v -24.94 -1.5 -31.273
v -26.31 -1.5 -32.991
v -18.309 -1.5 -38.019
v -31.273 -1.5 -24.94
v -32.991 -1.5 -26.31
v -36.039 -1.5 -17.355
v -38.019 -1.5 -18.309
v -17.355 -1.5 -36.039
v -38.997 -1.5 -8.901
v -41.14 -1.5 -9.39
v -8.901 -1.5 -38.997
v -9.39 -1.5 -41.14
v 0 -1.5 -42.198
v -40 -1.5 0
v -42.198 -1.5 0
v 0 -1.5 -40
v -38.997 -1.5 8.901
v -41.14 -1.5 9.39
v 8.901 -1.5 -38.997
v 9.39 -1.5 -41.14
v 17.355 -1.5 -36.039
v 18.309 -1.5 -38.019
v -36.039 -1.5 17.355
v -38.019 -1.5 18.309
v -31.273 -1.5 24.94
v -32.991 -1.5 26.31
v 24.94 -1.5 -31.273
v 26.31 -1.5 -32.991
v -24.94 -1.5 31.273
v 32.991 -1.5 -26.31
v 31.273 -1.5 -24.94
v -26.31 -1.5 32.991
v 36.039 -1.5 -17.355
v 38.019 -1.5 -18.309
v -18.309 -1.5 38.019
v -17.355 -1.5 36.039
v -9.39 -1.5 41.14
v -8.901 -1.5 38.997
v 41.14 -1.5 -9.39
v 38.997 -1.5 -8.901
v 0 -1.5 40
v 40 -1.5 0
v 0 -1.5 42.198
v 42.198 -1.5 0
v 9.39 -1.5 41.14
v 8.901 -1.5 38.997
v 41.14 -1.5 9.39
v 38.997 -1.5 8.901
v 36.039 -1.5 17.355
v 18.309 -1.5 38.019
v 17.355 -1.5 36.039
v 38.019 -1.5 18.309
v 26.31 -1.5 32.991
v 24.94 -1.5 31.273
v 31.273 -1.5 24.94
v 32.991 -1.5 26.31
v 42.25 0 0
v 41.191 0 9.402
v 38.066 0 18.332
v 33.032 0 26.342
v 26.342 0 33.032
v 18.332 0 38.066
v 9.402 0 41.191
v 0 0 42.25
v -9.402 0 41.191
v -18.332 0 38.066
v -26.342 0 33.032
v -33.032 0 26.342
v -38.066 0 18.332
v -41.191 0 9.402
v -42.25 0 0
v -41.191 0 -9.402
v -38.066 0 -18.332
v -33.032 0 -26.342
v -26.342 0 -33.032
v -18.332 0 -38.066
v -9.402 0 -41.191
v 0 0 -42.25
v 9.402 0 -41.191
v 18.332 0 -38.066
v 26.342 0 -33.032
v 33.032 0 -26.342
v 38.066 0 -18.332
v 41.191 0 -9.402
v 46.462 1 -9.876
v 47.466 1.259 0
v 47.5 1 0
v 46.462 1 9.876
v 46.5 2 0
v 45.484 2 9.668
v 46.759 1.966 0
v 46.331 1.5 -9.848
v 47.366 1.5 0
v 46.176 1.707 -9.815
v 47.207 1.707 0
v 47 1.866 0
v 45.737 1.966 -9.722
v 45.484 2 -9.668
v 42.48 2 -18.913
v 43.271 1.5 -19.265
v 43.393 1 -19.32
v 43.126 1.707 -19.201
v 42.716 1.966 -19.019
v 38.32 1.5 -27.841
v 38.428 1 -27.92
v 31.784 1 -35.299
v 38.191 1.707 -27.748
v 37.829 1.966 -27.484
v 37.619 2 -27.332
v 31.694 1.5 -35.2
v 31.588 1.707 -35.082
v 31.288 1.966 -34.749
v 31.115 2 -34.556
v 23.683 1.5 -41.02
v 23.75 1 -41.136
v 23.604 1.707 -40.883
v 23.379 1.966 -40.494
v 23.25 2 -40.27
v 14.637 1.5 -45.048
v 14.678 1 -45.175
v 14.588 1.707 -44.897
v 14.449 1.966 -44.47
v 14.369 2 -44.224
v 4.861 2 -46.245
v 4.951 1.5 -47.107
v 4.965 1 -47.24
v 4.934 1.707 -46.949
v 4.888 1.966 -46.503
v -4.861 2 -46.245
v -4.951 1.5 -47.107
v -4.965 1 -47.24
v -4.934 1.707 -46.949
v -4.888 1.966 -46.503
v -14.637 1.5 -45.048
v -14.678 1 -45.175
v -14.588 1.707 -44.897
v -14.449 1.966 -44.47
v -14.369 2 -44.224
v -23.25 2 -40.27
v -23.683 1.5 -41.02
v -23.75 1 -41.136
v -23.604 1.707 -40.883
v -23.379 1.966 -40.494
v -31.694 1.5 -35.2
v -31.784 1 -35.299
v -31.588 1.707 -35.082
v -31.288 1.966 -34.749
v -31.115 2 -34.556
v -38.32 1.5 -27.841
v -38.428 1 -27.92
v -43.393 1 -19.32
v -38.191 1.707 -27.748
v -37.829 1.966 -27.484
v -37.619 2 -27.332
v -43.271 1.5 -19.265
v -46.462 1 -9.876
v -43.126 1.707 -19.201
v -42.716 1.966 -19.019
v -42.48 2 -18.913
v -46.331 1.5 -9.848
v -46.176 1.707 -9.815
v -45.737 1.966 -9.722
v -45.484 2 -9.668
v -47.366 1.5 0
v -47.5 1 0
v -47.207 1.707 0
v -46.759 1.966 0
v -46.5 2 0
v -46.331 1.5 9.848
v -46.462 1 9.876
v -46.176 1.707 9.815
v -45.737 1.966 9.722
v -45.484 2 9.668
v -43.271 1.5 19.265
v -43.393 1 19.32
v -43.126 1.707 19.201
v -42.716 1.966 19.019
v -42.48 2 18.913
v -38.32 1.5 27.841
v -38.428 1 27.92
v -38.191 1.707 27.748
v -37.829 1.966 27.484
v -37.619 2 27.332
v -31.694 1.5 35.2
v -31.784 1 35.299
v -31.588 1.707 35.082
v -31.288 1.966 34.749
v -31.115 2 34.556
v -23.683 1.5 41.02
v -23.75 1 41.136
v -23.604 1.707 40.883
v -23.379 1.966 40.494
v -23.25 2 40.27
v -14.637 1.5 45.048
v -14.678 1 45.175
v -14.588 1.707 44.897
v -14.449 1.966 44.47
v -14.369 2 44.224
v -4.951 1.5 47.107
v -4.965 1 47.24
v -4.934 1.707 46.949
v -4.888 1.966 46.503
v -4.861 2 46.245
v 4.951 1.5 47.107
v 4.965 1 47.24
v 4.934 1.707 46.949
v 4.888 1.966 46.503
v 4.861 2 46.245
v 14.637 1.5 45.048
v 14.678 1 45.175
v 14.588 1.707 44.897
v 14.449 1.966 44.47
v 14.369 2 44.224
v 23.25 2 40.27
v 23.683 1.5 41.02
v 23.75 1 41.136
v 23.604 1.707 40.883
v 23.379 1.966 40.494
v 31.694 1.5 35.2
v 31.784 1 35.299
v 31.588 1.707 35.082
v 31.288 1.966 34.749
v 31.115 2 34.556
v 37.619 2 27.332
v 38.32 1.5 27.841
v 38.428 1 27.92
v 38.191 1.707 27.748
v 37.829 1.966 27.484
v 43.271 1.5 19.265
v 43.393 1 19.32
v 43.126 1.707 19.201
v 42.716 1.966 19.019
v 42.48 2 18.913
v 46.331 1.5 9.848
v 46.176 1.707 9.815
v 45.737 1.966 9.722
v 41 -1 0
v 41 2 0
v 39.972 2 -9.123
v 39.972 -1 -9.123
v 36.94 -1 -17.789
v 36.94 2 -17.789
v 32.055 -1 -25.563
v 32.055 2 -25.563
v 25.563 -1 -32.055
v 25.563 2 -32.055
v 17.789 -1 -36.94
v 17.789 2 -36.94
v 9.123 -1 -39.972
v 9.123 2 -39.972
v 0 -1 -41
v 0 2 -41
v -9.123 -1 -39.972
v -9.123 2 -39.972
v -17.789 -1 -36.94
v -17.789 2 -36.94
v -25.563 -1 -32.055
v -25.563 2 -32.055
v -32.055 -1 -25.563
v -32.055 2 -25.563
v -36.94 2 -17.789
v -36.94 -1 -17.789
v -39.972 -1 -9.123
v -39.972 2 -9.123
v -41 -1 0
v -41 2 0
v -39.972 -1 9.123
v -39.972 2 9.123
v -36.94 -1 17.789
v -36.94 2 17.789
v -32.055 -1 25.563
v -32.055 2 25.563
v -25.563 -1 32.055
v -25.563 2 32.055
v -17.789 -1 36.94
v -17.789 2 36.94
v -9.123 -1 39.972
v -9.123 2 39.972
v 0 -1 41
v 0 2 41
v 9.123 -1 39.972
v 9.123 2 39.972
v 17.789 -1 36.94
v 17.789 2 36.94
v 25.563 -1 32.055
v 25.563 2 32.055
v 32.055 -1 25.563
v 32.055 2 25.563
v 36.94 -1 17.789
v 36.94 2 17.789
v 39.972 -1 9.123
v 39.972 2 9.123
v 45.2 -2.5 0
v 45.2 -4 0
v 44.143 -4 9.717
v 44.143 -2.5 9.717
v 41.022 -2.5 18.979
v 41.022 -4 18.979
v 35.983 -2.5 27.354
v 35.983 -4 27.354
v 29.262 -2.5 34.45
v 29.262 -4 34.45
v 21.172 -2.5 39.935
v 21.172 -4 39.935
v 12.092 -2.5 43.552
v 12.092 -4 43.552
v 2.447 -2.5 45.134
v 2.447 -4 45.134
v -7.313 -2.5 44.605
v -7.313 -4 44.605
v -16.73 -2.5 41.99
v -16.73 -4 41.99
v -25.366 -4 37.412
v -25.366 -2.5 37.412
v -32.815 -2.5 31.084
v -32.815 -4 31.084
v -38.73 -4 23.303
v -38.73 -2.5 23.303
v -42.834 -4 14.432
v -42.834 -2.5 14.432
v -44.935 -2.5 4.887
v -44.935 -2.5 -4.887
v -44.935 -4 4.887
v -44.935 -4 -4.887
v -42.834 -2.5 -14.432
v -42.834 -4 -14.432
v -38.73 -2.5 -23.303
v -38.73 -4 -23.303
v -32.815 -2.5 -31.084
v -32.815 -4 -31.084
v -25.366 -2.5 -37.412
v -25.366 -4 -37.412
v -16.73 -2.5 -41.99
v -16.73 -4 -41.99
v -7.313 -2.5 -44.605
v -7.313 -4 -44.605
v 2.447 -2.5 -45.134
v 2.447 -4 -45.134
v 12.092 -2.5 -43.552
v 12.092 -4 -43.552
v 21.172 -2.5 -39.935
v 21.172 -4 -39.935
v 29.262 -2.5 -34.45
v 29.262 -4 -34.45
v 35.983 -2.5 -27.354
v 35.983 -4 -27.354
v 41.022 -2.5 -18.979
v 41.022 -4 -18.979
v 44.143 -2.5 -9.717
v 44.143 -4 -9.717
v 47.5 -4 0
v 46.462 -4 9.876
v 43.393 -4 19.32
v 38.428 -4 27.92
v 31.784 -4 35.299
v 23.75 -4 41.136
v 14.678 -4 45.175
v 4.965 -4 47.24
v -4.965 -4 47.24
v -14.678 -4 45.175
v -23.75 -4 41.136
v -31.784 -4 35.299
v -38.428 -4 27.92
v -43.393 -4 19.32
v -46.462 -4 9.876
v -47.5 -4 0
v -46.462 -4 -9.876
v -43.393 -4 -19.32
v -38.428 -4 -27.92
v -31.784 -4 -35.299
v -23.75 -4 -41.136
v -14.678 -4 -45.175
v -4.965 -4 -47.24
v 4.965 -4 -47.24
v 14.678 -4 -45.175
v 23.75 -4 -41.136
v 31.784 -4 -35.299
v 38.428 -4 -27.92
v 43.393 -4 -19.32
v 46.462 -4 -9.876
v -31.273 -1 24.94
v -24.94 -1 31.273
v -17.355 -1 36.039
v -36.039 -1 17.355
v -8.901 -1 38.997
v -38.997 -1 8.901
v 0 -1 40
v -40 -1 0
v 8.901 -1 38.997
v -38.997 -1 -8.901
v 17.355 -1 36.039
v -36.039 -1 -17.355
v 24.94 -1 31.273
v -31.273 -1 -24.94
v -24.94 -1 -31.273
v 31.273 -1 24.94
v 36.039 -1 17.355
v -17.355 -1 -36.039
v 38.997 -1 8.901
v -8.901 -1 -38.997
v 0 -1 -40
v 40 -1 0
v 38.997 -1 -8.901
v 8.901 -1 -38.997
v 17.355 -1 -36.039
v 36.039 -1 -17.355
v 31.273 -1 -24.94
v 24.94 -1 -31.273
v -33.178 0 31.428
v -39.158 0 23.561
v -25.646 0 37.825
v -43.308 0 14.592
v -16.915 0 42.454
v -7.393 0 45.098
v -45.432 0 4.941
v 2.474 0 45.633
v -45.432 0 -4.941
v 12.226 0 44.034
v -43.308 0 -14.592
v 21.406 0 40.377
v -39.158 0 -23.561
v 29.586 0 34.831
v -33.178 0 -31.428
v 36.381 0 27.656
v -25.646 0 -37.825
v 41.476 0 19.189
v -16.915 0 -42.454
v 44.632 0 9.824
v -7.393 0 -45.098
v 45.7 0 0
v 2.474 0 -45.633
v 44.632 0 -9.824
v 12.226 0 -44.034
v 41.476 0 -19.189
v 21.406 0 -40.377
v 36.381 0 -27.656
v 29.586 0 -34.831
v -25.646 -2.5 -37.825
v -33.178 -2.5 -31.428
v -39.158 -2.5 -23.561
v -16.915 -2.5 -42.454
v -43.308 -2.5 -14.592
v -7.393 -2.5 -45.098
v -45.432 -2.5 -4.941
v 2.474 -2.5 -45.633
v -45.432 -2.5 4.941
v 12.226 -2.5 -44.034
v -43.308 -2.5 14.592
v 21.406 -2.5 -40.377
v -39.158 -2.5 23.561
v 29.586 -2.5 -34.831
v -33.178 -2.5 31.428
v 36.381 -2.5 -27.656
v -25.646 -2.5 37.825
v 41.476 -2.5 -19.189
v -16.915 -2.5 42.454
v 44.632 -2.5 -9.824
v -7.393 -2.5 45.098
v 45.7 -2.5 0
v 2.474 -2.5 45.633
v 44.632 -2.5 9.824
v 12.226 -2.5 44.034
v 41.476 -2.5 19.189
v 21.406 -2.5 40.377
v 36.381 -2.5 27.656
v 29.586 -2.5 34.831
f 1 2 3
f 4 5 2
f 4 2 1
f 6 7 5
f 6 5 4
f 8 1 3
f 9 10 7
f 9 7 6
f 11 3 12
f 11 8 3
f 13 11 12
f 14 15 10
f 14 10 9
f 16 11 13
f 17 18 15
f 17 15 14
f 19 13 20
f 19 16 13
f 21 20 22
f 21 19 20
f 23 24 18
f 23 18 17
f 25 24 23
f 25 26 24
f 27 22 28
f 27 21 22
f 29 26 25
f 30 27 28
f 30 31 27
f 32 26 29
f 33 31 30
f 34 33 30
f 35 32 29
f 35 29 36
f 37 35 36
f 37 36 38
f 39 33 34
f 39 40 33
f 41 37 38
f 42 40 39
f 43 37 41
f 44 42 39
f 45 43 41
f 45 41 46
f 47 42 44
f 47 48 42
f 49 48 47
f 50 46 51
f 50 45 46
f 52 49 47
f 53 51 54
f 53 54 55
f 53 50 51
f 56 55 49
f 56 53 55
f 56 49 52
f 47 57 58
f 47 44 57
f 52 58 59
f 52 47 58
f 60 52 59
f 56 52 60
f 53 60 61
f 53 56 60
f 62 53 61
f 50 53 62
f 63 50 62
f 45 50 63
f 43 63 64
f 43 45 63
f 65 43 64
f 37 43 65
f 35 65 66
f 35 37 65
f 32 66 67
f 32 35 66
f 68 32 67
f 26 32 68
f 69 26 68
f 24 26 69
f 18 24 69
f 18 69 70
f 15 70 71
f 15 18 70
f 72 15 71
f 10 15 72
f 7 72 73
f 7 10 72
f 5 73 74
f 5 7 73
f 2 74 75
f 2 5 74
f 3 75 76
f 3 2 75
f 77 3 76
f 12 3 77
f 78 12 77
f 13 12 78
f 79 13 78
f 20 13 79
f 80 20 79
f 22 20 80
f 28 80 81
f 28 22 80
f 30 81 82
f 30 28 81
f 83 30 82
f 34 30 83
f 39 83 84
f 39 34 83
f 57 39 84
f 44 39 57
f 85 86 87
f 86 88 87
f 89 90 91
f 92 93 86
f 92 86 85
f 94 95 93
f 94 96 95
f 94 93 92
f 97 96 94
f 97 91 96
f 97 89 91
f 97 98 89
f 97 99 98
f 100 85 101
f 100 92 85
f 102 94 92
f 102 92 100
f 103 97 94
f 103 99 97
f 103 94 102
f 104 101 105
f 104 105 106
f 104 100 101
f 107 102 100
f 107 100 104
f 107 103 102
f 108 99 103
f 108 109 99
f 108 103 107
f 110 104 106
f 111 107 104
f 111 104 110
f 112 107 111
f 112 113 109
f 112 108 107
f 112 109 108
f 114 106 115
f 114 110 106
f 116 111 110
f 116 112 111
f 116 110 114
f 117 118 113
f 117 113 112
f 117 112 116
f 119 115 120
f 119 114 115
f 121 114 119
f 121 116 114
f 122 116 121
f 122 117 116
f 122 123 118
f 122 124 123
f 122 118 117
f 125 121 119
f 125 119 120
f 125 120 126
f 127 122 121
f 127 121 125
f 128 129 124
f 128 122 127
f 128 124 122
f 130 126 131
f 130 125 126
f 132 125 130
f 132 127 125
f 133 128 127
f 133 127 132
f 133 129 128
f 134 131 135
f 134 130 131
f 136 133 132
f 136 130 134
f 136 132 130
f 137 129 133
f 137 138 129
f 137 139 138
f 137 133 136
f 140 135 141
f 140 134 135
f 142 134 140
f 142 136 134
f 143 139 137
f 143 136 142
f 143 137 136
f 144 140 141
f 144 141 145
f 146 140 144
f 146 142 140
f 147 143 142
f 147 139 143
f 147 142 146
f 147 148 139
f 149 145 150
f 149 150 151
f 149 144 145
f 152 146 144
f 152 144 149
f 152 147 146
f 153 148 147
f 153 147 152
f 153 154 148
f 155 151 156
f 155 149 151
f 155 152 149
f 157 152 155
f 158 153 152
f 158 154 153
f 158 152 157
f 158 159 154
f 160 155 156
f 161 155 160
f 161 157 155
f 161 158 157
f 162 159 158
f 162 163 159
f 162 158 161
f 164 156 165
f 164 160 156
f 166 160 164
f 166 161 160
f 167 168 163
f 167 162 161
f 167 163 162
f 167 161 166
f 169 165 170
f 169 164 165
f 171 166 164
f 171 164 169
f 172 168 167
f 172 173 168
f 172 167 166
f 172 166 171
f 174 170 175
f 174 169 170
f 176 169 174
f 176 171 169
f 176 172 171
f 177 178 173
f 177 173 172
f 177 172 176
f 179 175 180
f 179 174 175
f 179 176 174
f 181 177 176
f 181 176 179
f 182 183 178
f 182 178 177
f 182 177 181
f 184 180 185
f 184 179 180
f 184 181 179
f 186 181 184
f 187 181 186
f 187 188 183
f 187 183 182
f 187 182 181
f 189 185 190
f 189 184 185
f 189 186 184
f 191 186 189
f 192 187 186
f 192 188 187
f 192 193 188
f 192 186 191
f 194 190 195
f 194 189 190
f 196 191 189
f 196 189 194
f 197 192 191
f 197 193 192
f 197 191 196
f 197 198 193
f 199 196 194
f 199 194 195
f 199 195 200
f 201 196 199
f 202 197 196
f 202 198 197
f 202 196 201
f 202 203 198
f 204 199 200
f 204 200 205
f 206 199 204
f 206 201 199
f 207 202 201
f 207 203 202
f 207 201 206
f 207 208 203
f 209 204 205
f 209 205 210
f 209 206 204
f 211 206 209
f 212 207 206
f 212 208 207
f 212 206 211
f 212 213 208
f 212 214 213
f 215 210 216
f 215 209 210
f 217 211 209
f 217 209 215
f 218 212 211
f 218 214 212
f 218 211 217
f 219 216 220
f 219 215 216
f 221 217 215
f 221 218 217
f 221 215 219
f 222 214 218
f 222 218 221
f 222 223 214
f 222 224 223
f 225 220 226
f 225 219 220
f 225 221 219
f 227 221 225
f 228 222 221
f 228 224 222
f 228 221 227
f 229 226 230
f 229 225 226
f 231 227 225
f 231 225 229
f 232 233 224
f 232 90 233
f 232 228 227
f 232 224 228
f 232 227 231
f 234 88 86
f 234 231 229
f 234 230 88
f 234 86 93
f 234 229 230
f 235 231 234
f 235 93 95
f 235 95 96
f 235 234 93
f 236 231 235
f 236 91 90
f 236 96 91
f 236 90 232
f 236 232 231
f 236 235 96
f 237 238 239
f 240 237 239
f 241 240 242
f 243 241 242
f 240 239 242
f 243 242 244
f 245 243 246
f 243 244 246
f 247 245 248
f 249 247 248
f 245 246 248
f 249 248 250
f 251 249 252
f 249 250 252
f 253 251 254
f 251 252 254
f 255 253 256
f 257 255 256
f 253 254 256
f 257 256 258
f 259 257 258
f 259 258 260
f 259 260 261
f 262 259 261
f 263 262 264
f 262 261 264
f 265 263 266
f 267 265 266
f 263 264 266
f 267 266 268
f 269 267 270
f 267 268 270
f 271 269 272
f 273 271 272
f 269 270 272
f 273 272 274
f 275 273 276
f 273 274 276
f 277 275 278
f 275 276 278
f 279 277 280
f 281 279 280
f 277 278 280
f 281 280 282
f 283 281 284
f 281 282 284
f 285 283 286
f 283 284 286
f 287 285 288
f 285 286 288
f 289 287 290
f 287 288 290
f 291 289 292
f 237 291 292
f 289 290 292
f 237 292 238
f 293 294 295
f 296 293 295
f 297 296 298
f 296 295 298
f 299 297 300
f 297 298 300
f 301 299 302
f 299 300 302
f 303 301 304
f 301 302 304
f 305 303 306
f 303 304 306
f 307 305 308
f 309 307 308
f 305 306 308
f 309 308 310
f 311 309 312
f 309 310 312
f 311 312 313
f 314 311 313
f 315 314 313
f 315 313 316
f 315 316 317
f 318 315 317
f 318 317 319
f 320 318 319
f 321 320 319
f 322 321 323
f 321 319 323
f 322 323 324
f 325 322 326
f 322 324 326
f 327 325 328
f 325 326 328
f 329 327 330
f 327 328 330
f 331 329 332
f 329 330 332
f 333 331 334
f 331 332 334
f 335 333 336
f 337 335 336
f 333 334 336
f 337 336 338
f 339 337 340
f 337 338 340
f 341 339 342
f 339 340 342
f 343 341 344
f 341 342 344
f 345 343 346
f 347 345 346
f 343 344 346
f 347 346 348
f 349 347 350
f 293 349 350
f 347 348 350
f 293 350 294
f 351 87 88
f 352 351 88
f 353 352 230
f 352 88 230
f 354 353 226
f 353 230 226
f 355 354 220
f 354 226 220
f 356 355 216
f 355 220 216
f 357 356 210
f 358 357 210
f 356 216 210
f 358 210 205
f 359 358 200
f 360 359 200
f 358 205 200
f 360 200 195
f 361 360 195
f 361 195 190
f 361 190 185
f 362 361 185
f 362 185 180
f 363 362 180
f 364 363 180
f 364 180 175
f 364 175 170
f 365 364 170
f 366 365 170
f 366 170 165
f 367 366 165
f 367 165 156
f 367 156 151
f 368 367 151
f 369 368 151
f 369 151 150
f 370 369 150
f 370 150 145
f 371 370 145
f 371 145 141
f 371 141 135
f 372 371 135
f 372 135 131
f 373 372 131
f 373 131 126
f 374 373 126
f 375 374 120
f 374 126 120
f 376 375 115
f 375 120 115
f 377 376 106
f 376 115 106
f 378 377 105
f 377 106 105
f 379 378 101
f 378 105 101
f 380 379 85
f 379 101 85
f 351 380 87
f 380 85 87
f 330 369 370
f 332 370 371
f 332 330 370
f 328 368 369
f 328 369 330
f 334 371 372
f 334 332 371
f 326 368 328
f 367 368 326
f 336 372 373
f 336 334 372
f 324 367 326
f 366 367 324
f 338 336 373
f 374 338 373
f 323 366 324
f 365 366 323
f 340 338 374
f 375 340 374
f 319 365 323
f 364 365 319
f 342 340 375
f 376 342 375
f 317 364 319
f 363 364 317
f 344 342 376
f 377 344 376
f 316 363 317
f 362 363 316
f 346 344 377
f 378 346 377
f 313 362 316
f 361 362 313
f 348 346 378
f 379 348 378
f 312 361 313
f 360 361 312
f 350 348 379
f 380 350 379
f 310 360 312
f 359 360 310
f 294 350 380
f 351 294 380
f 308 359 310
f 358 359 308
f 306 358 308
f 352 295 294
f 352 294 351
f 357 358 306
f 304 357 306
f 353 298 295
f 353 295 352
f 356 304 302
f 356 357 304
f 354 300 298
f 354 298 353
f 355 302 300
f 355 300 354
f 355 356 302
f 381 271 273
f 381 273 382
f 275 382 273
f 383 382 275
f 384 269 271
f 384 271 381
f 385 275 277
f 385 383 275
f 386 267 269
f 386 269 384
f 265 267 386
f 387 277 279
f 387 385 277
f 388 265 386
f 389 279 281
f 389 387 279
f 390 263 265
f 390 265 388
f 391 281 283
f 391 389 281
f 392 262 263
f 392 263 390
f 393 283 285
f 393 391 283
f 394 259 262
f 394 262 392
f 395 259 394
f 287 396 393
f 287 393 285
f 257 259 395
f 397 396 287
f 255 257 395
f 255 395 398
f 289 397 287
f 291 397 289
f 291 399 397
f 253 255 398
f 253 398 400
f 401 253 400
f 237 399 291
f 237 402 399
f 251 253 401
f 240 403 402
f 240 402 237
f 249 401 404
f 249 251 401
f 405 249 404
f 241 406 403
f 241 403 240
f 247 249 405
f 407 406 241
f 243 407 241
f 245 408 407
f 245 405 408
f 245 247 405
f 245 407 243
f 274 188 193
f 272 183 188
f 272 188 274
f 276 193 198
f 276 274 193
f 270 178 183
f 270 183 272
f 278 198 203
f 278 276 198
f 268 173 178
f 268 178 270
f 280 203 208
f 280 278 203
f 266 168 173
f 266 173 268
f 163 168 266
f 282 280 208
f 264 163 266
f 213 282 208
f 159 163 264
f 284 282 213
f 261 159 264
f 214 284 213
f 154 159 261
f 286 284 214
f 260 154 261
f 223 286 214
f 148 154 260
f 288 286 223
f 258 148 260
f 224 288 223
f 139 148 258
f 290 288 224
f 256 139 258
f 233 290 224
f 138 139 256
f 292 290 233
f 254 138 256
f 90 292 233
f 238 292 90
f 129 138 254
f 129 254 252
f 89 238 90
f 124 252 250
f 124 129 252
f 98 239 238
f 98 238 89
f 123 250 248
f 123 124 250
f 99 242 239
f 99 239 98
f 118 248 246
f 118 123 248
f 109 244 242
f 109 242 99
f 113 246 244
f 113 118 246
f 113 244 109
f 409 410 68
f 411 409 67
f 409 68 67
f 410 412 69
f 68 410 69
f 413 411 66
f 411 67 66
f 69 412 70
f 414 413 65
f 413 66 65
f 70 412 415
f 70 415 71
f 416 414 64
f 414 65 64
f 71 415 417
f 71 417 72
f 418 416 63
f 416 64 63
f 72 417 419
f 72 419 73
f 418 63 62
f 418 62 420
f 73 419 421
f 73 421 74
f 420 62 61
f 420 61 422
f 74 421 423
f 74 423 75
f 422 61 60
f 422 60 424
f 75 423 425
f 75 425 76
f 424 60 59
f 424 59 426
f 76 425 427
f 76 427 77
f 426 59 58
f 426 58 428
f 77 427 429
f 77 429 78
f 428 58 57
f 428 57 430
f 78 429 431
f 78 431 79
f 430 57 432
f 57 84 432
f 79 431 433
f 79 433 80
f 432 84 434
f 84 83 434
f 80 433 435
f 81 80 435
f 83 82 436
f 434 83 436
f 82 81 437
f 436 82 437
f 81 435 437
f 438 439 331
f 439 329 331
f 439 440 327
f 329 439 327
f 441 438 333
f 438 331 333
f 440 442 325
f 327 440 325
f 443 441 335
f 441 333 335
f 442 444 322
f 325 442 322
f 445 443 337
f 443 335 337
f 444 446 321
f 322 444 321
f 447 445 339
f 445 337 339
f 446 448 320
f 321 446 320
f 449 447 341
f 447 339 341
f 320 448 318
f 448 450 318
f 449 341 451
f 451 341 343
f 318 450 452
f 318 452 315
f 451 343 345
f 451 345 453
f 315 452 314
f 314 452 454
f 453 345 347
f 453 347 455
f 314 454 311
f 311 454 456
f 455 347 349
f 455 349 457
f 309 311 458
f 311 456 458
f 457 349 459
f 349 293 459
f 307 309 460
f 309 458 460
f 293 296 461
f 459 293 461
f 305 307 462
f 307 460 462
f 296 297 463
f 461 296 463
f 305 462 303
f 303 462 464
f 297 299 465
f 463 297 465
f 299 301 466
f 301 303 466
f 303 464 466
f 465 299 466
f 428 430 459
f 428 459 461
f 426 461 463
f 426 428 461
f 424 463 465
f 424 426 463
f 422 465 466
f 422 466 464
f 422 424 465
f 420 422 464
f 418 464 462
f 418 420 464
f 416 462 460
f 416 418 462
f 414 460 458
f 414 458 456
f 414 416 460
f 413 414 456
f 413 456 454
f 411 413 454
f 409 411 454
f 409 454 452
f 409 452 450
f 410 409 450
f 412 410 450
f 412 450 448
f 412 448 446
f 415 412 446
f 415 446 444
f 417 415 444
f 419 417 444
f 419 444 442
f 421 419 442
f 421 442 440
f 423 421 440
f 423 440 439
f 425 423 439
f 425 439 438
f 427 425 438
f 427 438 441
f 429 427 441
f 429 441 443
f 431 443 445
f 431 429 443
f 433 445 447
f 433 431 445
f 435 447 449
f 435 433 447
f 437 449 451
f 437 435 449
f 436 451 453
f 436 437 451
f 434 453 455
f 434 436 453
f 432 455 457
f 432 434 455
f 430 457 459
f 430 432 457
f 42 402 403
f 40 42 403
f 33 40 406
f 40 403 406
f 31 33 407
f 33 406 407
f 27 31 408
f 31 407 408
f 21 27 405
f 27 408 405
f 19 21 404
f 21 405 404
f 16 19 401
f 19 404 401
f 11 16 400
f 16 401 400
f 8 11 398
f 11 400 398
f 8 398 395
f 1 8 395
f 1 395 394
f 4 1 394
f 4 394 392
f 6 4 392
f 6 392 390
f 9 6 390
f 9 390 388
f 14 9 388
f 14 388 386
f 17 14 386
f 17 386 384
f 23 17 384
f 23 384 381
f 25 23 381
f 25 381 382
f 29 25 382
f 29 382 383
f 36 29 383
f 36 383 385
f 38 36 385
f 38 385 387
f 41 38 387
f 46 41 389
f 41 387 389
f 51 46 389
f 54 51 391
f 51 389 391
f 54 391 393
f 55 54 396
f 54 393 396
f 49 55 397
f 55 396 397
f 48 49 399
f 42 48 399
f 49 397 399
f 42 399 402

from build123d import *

# Parameters (mm, degrees)
SKETCH1_R           = 47.5
BOSS_EXTRUDE1_DEPTH = 2
SKETCH2_R           = 42.25
BOSS_EXTRUDE2_DEPTH = 1.5
BOSS_EXTRUDE2_TAPER = 2
SKETCH5_R           = 10
CUT_EXTRUDE1_DEPTH  = 4
CHAMFER1_SIZE       = 1
SKETCH7_R           = 47.5
SKETCH7_R_2         = 45.7
BOSS_EXTRUDE3_DEPTH = 4
FILLET2_R           = 1
SKETCH8_R           = 41
CUT_EXTRUDE4_DEPTH  = 3
SKETCH9_R           = 40
CUT_EXTRUDE5_DEPTH  = 5
SKETCH10_R          = 45.7
SKETCH10_R_2        = 45.2
BOSS_EXTRUDE4_DEPTH = 1.5


with BuildPart() as part:
    # Sketch1 → Boss-Extrude1 (new body)
    with BuildSketch(Plane(origin=(0, 0, 0), x_dir=(1, 0, 0), z_dir=(0, 1, 0))):
        Circle(SKETCH1_R)
    extrude(amount=BOSS_EXTRUDE1_DEPTH)

    # Sketch2 → Boss-Extrude2 (add)
    with BuildSketch(Plane.XZ):
        Circle(SKETCH2_R)
    extrude(amount=BOSS_EXTRUDE2_DEPTH, taper=BOSS_EXTRUDE2_TAPER)

    # Sketch5 → Cut-Extrude1 (cut)
    with BuildSketch(Plane(origin=(0, 2, 0), x_dir=(1, 0, 0), z_dir=(0, 1, 0))):
        Circle(SKETCH5_R)
    extrude(amount=-CUT_EXTRUDE1_DEPTH, mode=Mode.SUBTRACT)

    # Chamfer1
    chamfer1_edges = [part.edges().sort_by_distance(p)[0] for p in [
        (-10, -1.5, 0),
        (-10, 2, 0),
    ]]
    chamfer(chamfer1_edges, length=CHAMFER1_SIZE)

    # Sketch7 → Boss-Extrude3 (add)
    with BuildSketch(Plane.XZ):
        Circle(SKETCH7_R)
        Circle(SKETCH7_R_2, mode=Mode.SUBTRACT)
    extrude(amount=BOSS_EXTRUDE3_DEPTH)

    # Fillet2
    fillet2_edges = [part.edges().sort_by_distance(p)[0] for p in [
        (-47.5, 2, 0),
    ]]
    fillet(fillet2_edges, radius=FILLET2_R)

    # Sketch8 → Cut-Extrude4 (cut)
    with BuildSketch(Plane(origin=(0, 2, 0), x_dir=(1, 0, 0), z_dir=(0, 1, 0))):
        Circle(SKETCH8_R)
    extrude(amount=-CUT_EXTRUDE4_DEPTH, mode=Mode.SUBTRACT)

    # Sketch9 → Cut-Extrude5 (cut)
    with BuildSketch(Plane(origin=(0, -1, 0), x_dir=(1, 0, 0), z_dir=(0, 1, 0))):
        Circle(SKETCH9_R)
    extrude(amount=-CUT_EXTRUDE5_DEPTH, mode=Mode.SUBTRACT)

    # Sketch10 → Boss-Extrude4 (add)
    with BuildSketch(Plane.XZ.offset(4)):
        Circle(SKETCH10_R)
        Circle(SKETCH10_R_2, mode=Mode.SUBTRACT)
    extrude(amount=-BOSS_EXTRUDE4_DEPTH)


solid = part.part
